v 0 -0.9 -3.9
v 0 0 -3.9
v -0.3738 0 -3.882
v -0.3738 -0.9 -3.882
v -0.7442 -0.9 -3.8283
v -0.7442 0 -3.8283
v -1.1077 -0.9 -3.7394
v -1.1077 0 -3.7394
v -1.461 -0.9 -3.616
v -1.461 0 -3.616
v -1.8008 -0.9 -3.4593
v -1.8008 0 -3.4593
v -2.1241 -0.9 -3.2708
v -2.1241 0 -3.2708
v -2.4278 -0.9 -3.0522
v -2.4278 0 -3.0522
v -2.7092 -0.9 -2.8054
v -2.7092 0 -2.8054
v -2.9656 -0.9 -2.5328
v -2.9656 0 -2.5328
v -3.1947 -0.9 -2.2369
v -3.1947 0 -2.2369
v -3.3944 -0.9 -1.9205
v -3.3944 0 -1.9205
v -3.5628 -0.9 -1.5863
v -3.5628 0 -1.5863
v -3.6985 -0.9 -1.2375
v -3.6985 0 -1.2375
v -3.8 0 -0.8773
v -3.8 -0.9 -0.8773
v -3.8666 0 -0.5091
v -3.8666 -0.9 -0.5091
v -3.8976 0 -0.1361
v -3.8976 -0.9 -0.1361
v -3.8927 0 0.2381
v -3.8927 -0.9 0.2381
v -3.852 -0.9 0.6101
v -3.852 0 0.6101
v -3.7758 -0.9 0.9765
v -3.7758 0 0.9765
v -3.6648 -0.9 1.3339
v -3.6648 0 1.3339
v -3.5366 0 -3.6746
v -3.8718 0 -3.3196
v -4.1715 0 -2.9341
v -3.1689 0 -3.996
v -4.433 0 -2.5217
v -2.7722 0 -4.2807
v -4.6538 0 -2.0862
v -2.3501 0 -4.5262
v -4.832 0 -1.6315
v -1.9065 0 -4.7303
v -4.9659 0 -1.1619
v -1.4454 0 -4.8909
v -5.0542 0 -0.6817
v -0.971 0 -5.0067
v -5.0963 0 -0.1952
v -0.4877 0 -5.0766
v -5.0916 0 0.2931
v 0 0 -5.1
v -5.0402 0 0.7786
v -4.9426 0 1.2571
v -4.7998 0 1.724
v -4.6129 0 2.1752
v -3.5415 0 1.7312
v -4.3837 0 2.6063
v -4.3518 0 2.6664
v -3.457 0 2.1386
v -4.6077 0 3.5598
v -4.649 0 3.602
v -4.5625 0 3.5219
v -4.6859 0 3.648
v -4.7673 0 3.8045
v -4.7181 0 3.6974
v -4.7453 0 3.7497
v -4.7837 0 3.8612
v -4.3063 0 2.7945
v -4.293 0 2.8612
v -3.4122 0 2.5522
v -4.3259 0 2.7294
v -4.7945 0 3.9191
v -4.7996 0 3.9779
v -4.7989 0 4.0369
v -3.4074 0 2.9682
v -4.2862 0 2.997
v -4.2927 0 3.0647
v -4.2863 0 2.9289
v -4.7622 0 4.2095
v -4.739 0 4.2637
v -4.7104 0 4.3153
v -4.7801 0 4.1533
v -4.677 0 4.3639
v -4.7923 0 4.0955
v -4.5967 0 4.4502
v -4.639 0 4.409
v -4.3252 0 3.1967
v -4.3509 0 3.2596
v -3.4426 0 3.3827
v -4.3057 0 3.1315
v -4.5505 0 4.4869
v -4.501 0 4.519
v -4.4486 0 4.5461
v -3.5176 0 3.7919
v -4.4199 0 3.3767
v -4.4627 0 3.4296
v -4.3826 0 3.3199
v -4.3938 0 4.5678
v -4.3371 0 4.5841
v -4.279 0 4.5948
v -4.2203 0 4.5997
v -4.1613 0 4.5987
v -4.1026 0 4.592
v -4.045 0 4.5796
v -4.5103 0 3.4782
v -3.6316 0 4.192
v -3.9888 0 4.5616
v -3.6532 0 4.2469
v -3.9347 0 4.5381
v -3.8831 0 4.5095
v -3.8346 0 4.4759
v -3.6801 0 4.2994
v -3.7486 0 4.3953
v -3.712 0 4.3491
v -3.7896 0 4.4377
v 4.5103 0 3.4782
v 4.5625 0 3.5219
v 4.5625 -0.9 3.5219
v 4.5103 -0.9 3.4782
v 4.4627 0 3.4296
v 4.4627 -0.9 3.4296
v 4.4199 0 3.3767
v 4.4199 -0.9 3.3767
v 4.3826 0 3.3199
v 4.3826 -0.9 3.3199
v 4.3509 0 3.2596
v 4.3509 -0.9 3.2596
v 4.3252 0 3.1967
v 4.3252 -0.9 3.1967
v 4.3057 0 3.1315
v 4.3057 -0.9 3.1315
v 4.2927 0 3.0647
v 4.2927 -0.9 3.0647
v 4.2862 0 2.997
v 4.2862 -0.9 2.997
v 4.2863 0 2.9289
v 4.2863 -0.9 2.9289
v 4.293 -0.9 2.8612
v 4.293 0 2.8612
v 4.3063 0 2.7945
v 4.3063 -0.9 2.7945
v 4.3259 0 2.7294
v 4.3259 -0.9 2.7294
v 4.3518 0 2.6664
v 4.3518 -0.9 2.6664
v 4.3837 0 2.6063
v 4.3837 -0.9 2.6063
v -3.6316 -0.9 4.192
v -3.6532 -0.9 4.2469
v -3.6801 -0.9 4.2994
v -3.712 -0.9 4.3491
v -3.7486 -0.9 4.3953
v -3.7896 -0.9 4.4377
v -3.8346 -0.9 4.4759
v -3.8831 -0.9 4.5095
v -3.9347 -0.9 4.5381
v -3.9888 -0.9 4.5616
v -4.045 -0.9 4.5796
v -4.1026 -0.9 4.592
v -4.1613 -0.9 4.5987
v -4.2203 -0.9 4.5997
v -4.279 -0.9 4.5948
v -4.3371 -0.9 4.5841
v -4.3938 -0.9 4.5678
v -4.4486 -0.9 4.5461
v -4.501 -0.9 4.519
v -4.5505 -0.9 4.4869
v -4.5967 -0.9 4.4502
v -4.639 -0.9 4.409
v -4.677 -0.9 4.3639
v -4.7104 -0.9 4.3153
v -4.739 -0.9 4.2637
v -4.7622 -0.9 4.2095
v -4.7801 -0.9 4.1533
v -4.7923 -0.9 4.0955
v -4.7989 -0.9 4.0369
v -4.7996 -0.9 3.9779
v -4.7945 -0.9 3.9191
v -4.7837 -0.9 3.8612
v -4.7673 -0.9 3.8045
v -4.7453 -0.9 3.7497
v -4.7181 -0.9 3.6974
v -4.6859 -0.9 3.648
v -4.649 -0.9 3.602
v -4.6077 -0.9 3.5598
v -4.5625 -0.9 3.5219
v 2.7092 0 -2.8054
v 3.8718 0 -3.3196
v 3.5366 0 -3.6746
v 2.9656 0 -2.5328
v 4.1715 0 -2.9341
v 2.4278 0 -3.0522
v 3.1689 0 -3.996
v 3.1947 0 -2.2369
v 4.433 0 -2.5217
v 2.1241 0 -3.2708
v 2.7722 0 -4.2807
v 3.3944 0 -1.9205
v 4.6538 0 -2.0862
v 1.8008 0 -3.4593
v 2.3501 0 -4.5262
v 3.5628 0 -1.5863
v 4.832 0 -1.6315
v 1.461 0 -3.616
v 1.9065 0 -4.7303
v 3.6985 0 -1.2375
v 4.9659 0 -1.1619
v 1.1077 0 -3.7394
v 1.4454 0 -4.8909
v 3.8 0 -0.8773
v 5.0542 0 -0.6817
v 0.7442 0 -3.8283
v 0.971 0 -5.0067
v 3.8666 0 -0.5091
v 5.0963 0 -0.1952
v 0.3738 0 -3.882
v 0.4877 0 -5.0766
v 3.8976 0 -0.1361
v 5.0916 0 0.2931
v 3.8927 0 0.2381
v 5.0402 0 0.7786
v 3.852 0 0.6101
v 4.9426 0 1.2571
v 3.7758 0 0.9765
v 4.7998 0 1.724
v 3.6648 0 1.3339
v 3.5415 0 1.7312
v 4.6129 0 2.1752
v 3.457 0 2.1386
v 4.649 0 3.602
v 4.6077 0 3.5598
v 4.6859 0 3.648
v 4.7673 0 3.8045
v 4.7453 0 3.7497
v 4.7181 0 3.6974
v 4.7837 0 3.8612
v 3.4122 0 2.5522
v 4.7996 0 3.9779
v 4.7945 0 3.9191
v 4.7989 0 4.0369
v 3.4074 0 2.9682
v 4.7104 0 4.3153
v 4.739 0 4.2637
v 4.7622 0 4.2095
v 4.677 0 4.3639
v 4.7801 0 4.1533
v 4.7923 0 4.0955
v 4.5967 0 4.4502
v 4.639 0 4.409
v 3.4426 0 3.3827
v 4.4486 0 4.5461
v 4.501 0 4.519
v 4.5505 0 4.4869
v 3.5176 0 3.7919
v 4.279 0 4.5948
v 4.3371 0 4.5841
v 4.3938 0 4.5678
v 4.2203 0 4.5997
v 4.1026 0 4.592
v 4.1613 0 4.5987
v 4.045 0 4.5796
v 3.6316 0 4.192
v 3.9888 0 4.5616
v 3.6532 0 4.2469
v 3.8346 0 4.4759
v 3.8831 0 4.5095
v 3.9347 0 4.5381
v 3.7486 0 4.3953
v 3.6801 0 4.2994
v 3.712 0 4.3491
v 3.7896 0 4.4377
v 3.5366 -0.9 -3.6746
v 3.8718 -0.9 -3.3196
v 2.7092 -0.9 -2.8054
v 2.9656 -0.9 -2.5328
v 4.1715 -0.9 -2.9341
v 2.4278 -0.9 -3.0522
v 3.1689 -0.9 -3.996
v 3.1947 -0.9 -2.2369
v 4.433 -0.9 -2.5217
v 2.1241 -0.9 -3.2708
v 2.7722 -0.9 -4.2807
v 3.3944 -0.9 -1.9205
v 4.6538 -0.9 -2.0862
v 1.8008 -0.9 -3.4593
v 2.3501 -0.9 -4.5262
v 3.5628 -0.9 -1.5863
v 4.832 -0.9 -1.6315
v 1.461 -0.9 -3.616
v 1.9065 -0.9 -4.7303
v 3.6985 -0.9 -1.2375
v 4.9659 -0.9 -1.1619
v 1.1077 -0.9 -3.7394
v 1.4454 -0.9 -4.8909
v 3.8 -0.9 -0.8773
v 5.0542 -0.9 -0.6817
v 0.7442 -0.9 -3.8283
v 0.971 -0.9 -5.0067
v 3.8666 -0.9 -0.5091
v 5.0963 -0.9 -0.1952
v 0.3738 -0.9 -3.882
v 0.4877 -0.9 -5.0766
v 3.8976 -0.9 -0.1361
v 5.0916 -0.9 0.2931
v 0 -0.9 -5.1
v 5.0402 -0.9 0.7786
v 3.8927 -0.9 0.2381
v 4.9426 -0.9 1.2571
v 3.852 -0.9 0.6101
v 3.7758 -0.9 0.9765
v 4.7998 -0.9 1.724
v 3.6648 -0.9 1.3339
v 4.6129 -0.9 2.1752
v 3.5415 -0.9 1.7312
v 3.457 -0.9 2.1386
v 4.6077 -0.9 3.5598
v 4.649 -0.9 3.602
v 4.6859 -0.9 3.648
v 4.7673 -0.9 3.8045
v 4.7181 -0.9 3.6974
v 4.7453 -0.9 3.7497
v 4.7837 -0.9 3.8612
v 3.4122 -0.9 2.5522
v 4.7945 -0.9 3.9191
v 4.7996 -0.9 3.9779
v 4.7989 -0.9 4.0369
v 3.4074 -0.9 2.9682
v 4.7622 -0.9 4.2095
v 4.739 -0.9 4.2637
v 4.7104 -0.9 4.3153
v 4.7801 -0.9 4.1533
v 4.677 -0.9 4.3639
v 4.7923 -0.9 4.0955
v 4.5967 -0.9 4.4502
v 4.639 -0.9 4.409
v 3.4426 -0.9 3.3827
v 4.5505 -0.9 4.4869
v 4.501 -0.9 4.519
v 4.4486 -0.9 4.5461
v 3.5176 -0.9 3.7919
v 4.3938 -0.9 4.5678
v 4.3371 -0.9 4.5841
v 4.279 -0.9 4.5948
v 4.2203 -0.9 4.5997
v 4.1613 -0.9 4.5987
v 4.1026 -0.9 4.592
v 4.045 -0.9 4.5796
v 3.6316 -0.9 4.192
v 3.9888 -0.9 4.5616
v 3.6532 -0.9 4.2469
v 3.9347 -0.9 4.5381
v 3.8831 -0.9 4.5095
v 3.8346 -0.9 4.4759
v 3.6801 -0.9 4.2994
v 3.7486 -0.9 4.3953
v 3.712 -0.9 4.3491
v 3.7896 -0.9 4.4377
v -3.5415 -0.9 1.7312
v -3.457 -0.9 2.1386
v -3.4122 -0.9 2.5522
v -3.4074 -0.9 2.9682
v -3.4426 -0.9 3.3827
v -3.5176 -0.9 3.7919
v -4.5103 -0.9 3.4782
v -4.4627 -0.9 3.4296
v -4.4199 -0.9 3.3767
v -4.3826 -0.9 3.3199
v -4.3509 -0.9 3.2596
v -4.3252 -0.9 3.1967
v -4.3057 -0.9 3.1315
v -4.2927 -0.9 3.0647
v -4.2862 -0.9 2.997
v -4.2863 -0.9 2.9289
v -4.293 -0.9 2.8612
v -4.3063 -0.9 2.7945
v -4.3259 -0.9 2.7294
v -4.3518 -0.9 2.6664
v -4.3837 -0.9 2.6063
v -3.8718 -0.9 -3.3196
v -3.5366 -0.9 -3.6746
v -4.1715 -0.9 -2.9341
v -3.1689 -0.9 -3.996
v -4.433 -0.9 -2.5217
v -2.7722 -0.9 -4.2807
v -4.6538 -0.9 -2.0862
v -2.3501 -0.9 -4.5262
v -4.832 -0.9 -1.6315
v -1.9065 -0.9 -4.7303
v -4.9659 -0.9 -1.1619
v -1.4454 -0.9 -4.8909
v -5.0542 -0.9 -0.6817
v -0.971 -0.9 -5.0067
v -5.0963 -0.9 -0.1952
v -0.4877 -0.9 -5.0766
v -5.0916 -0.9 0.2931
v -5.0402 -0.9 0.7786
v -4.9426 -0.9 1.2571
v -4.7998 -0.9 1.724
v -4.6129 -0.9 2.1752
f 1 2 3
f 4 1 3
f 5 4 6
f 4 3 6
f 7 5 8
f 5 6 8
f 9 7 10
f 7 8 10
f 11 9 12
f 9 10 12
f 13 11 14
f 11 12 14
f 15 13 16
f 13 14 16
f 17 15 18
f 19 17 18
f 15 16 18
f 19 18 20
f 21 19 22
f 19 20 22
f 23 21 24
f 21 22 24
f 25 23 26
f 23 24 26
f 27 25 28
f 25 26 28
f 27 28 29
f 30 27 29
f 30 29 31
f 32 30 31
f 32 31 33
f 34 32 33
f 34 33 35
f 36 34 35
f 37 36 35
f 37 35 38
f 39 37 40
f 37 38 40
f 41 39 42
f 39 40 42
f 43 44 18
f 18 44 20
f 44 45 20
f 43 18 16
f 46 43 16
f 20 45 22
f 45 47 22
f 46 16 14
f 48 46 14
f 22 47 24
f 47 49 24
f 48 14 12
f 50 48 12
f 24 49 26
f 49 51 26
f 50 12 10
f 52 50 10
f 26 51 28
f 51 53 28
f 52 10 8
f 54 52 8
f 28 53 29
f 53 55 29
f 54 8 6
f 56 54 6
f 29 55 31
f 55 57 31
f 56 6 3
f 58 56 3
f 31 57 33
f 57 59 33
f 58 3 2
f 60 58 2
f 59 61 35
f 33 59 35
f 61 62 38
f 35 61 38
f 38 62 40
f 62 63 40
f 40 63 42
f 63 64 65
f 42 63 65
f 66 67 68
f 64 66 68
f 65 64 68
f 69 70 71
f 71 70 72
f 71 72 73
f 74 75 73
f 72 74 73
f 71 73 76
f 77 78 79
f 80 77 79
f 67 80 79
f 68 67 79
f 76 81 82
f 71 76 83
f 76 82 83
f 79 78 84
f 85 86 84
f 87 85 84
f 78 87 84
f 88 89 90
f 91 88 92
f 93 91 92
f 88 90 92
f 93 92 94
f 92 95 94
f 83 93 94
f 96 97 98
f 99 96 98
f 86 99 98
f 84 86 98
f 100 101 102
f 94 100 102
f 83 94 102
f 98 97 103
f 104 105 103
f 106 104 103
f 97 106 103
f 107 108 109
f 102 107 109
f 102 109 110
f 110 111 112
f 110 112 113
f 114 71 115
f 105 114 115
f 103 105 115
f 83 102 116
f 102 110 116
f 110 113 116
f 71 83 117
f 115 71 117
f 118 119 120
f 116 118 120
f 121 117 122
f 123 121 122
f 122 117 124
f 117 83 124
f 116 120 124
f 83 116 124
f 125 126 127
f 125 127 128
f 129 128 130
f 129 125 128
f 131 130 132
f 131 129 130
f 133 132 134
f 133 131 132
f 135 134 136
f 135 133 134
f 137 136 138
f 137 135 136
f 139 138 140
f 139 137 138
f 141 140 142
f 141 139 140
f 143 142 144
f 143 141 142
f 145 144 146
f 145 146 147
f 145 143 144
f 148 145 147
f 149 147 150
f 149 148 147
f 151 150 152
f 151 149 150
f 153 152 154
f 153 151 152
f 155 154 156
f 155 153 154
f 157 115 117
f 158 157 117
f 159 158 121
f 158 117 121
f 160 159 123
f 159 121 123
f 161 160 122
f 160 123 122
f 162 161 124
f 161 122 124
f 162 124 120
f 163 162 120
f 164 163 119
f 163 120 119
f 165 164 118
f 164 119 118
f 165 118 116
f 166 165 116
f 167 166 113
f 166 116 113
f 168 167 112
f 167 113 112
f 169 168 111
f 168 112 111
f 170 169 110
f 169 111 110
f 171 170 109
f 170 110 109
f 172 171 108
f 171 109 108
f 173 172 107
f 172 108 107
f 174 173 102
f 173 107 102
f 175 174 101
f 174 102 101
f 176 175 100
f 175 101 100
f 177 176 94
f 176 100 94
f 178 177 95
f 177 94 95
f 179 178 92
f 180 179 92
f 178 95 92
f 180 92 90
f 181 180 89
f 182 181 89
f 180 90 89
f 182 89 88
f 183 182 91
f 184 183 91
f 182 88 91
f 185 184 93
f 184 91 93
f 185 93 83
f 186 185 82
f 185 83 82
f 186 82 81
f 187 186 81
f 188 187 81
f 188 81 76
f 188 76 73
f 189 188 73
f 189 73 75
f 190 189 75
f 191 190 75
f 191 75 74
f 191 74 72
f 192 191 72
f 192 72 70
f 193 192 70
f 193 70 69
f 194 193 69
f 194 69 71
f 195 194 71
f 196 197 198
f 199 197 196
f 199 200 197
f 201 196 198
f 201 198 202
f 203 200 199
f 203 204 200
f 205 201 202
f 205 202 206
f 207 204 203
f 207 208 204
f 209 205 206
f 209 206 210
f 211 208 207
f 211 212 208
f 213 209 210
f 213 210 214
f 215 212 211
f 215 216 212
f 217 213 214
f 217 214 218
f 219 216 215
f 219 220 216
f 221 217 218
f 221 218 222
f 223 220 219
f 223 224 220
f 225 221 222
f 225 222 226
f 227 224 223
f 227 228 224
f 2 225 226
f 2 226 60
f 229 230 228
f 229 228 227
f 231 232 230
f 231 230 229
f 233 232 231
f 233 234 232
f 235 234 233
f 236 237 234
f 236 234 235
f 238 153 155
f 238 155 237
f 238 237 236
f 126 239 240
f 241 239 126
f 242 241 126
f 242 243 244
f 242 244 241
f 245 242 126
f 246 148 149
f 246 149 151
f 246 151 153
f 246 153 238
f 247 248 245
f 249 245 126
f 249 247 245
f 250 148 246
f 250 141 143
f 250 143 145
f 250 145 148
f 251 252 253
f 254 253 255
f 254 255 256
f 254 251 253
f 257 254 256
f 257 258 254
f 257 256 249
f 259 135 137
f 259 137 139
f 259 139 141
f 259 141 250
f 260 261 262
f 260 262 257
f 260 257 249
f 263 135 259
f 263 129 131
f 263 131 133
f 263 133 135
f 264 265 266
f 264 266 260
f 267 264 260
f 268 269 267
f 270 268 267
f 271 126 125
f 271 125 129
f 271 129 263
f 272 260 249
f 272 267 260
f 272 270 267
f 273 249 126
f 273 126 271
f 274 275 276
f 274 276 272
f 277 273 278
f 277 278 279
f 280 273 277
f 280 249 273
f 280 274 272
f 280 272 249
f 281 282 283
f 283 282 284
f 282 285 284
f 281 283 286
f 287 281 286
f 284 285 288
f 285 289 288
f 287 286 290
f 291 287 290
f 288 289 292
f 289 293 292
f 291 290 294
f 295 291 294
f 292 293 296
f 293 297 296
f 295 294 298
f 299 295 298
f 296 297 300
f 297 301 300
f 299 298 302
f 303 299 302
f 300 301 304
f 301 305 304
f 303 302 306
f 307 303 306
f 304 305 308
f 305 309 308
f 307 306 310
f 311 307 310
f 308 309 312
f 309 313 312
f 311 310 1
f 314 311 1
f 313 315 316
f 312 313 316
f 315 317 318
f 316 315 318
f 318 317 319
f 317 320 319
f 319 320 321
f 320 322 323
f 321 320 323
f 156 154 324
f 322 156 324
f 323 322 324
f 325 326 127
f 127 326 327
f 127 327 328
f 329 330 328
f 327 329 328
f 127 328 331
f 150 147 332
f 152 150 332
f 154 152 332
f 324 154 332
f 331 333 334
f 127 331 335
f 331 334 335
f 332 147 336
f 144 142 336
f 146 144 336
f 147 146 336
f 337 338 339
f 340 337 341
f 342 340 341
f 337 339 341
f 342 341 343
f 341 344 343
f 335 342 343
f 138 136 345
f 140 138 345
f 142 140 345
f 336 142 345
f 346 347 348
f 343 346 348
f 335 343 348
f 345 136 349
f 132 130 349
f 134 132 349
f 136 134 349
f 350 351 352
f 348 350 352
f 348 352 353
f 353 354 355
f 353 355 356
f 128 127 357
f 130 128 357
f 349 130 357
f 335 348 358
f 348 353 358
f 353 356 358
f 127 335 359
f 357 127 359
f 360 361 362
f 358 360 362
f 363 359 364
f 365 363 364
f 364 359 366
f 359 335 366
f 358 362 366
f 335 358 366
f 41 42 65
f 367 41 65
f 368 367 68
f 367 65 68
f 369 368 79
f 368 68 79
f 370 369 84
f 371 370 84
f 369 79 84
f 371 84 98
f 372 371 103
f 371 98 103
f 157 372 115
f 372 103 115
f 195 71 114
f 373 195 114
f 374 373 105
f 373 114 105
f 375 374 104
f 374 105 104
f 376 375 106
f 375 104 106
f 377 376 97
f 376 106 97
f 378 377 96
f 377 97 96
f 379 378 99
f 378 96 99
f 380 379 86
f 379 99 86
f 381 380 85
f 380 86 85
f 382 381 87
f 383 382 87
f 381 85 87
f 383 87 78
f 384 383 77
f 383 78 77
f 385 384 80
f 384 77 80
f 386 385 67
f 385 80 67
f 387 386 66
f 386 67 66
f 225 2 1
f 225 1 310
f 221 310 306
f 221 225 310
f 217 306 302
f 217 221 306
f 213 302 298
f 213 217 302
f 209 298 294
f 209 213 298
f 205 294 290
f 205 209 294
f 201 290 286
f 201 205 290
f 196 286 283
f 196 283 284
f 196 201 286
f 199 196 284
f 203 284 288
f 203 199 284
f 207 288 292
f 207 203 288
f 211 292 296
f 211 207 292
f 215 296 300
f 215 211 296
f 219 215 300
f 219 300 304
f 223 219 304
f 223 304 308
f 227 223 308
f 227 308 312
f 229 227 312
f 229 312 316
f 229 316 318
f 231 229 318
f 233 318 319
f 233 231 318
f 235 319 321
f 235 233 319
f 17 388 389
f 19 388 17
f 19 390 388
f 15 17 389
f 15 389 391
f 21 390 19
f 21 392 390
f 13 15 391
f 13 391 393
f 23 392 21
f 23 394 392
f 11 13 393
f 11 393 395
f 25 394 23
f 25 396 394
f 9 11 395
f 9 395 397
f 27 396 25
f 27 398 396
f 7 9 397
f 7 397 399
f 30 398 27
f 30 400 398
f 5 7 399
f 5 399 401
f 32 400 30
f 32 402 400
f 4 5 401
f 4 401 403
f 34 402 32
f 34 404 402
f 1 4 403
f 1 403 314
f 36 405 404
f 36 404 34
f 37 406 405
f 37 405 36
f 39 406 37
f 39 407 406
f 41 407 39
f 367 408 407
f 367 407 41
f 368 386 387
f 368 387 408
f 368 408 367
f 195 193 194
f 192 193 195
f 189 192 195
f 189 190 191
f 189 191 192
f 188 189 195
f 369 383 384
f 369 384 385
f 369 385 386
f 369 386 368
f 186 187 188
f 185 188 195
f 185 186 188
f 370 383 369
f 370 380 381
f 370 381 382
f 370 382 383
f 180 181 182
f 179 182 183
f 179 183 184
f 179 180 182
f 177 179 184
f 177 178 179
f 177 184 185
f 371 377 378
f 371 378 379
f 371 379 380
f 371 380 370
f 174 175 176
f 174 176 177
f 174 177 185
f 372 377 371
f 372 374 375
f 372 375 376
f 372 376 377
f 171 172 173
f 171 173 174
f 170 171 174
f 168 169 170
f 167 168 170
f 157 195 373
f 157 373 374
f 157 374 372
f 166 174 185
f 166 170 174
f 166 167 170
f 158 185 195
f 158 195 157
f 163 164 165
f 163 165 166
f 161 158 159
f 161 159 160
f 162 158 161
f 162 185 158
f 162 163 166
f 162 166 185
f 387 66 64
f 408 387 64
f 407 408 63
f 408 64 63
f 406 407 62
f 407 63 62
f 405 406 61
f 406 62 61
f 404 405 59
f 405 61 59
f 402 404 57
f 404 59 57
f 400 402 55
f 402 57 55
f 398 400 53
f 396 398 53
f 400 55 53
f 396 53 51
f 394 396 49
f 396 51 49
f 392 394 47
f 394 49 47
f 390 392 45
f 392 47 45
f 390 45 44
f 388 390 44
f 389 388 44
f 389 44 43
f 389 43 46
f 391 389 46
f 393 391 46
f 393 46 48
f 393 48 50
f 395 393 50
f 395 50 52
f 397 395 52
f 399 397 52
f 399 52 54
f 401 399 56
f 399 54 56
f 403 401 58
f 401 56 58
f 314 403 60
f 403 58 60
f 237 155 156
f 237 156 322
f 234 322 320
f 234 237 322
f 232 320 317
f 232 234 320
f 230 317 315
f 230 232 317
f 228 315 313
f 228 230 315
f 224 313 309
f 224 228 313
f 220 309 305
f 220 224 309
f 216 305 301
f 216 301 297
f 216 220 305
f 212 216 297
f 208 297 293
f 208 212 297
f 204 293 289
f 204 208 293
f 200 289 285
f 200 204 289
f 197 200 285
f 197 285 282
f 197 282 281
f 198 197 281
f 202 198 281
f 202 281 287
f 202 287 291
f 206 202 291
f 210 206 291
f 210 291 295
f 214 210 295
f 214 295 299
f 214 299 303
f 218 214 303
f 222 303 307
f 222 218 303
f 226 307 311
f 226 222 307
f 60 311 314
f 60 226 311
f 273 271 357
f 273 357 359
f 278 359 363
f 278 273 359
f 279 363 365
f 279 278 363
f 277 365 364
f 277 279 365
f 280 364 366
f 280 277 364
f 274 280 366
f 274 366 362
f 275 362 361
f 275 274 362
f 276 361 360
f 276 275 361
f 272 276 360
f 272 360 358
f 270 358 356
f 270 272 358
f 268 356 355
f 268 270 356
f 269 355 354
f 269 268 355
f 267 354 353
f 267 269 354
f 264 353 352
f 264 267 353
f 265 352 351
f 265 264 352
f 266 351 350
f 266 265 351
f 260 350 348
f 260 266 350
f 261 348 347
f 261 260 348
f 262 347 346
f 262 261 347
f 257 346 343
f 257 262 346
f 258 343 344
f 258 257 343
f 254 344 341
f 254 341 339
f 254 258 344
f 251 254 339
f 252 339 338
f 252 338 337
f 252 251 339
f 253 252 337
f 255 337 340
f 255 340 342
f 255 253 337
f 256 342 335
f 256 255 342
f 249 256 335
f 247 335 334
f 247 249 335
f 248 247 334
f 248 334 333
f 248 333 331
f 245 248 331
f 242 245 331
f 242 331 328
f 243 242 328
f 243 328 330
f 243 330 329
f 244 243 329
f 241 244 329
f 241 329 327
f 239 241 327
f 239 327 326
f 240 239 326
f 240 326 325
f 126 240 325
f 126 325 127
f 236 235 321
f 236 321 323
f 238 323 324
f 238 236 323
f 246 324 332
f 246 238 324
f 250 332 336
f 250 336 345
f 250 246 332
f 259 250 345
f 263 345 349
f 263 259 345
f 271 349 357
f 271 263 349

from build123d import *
from build123d import SkipClean  # not in build123d's __all__

# Parameters (mm, degrees)
F1_DEPTH = 0.9


with BuildPart() as f1:
    # F0 (on Front) → F1 (new body)
    with BuildSketch(Plane.XZ):
        with BuildLine():
            ThreePointArc((-3.6648012211, 1.333878559), (-3.4047554287, 2.7601313999), (-3.6315648982, 4.1920456588))
            ThreePointArc((-3.6315648982, 4.1920456588), (-4.5505468427, 4.4869465177), (-4.562494352, 3.5218809304))
            ThreePointArc((-4.562494352, 3.5218809304), (-4.2983800559, 3.0982301484), (-4.3837176879, 2.6063421173))
            ThreePointArc((-4.3837176879, 2.6063421173), (-4.4329642903, -2.5216715886), (0, -5.1))
            Line((0, -5.1), (0, -3.9))
            ThreePointArc((0, -3.9), (-3.1946929727, -2.2369481018), (-3.6648012211, 1.333878559))
        make_face()
    extrude(amount=F1_DEPTH)

    # F2: F1 across plane


with BuildPart() as f1_1:
    add(f1.part, clean=False)
    with SkipClean():  # cleaning this boolean's faces spoils the solid; the shape is the same uncleaned
        add(f1.part.mirror(Plane.YZ), clean=False)


solid = f1_1.part
